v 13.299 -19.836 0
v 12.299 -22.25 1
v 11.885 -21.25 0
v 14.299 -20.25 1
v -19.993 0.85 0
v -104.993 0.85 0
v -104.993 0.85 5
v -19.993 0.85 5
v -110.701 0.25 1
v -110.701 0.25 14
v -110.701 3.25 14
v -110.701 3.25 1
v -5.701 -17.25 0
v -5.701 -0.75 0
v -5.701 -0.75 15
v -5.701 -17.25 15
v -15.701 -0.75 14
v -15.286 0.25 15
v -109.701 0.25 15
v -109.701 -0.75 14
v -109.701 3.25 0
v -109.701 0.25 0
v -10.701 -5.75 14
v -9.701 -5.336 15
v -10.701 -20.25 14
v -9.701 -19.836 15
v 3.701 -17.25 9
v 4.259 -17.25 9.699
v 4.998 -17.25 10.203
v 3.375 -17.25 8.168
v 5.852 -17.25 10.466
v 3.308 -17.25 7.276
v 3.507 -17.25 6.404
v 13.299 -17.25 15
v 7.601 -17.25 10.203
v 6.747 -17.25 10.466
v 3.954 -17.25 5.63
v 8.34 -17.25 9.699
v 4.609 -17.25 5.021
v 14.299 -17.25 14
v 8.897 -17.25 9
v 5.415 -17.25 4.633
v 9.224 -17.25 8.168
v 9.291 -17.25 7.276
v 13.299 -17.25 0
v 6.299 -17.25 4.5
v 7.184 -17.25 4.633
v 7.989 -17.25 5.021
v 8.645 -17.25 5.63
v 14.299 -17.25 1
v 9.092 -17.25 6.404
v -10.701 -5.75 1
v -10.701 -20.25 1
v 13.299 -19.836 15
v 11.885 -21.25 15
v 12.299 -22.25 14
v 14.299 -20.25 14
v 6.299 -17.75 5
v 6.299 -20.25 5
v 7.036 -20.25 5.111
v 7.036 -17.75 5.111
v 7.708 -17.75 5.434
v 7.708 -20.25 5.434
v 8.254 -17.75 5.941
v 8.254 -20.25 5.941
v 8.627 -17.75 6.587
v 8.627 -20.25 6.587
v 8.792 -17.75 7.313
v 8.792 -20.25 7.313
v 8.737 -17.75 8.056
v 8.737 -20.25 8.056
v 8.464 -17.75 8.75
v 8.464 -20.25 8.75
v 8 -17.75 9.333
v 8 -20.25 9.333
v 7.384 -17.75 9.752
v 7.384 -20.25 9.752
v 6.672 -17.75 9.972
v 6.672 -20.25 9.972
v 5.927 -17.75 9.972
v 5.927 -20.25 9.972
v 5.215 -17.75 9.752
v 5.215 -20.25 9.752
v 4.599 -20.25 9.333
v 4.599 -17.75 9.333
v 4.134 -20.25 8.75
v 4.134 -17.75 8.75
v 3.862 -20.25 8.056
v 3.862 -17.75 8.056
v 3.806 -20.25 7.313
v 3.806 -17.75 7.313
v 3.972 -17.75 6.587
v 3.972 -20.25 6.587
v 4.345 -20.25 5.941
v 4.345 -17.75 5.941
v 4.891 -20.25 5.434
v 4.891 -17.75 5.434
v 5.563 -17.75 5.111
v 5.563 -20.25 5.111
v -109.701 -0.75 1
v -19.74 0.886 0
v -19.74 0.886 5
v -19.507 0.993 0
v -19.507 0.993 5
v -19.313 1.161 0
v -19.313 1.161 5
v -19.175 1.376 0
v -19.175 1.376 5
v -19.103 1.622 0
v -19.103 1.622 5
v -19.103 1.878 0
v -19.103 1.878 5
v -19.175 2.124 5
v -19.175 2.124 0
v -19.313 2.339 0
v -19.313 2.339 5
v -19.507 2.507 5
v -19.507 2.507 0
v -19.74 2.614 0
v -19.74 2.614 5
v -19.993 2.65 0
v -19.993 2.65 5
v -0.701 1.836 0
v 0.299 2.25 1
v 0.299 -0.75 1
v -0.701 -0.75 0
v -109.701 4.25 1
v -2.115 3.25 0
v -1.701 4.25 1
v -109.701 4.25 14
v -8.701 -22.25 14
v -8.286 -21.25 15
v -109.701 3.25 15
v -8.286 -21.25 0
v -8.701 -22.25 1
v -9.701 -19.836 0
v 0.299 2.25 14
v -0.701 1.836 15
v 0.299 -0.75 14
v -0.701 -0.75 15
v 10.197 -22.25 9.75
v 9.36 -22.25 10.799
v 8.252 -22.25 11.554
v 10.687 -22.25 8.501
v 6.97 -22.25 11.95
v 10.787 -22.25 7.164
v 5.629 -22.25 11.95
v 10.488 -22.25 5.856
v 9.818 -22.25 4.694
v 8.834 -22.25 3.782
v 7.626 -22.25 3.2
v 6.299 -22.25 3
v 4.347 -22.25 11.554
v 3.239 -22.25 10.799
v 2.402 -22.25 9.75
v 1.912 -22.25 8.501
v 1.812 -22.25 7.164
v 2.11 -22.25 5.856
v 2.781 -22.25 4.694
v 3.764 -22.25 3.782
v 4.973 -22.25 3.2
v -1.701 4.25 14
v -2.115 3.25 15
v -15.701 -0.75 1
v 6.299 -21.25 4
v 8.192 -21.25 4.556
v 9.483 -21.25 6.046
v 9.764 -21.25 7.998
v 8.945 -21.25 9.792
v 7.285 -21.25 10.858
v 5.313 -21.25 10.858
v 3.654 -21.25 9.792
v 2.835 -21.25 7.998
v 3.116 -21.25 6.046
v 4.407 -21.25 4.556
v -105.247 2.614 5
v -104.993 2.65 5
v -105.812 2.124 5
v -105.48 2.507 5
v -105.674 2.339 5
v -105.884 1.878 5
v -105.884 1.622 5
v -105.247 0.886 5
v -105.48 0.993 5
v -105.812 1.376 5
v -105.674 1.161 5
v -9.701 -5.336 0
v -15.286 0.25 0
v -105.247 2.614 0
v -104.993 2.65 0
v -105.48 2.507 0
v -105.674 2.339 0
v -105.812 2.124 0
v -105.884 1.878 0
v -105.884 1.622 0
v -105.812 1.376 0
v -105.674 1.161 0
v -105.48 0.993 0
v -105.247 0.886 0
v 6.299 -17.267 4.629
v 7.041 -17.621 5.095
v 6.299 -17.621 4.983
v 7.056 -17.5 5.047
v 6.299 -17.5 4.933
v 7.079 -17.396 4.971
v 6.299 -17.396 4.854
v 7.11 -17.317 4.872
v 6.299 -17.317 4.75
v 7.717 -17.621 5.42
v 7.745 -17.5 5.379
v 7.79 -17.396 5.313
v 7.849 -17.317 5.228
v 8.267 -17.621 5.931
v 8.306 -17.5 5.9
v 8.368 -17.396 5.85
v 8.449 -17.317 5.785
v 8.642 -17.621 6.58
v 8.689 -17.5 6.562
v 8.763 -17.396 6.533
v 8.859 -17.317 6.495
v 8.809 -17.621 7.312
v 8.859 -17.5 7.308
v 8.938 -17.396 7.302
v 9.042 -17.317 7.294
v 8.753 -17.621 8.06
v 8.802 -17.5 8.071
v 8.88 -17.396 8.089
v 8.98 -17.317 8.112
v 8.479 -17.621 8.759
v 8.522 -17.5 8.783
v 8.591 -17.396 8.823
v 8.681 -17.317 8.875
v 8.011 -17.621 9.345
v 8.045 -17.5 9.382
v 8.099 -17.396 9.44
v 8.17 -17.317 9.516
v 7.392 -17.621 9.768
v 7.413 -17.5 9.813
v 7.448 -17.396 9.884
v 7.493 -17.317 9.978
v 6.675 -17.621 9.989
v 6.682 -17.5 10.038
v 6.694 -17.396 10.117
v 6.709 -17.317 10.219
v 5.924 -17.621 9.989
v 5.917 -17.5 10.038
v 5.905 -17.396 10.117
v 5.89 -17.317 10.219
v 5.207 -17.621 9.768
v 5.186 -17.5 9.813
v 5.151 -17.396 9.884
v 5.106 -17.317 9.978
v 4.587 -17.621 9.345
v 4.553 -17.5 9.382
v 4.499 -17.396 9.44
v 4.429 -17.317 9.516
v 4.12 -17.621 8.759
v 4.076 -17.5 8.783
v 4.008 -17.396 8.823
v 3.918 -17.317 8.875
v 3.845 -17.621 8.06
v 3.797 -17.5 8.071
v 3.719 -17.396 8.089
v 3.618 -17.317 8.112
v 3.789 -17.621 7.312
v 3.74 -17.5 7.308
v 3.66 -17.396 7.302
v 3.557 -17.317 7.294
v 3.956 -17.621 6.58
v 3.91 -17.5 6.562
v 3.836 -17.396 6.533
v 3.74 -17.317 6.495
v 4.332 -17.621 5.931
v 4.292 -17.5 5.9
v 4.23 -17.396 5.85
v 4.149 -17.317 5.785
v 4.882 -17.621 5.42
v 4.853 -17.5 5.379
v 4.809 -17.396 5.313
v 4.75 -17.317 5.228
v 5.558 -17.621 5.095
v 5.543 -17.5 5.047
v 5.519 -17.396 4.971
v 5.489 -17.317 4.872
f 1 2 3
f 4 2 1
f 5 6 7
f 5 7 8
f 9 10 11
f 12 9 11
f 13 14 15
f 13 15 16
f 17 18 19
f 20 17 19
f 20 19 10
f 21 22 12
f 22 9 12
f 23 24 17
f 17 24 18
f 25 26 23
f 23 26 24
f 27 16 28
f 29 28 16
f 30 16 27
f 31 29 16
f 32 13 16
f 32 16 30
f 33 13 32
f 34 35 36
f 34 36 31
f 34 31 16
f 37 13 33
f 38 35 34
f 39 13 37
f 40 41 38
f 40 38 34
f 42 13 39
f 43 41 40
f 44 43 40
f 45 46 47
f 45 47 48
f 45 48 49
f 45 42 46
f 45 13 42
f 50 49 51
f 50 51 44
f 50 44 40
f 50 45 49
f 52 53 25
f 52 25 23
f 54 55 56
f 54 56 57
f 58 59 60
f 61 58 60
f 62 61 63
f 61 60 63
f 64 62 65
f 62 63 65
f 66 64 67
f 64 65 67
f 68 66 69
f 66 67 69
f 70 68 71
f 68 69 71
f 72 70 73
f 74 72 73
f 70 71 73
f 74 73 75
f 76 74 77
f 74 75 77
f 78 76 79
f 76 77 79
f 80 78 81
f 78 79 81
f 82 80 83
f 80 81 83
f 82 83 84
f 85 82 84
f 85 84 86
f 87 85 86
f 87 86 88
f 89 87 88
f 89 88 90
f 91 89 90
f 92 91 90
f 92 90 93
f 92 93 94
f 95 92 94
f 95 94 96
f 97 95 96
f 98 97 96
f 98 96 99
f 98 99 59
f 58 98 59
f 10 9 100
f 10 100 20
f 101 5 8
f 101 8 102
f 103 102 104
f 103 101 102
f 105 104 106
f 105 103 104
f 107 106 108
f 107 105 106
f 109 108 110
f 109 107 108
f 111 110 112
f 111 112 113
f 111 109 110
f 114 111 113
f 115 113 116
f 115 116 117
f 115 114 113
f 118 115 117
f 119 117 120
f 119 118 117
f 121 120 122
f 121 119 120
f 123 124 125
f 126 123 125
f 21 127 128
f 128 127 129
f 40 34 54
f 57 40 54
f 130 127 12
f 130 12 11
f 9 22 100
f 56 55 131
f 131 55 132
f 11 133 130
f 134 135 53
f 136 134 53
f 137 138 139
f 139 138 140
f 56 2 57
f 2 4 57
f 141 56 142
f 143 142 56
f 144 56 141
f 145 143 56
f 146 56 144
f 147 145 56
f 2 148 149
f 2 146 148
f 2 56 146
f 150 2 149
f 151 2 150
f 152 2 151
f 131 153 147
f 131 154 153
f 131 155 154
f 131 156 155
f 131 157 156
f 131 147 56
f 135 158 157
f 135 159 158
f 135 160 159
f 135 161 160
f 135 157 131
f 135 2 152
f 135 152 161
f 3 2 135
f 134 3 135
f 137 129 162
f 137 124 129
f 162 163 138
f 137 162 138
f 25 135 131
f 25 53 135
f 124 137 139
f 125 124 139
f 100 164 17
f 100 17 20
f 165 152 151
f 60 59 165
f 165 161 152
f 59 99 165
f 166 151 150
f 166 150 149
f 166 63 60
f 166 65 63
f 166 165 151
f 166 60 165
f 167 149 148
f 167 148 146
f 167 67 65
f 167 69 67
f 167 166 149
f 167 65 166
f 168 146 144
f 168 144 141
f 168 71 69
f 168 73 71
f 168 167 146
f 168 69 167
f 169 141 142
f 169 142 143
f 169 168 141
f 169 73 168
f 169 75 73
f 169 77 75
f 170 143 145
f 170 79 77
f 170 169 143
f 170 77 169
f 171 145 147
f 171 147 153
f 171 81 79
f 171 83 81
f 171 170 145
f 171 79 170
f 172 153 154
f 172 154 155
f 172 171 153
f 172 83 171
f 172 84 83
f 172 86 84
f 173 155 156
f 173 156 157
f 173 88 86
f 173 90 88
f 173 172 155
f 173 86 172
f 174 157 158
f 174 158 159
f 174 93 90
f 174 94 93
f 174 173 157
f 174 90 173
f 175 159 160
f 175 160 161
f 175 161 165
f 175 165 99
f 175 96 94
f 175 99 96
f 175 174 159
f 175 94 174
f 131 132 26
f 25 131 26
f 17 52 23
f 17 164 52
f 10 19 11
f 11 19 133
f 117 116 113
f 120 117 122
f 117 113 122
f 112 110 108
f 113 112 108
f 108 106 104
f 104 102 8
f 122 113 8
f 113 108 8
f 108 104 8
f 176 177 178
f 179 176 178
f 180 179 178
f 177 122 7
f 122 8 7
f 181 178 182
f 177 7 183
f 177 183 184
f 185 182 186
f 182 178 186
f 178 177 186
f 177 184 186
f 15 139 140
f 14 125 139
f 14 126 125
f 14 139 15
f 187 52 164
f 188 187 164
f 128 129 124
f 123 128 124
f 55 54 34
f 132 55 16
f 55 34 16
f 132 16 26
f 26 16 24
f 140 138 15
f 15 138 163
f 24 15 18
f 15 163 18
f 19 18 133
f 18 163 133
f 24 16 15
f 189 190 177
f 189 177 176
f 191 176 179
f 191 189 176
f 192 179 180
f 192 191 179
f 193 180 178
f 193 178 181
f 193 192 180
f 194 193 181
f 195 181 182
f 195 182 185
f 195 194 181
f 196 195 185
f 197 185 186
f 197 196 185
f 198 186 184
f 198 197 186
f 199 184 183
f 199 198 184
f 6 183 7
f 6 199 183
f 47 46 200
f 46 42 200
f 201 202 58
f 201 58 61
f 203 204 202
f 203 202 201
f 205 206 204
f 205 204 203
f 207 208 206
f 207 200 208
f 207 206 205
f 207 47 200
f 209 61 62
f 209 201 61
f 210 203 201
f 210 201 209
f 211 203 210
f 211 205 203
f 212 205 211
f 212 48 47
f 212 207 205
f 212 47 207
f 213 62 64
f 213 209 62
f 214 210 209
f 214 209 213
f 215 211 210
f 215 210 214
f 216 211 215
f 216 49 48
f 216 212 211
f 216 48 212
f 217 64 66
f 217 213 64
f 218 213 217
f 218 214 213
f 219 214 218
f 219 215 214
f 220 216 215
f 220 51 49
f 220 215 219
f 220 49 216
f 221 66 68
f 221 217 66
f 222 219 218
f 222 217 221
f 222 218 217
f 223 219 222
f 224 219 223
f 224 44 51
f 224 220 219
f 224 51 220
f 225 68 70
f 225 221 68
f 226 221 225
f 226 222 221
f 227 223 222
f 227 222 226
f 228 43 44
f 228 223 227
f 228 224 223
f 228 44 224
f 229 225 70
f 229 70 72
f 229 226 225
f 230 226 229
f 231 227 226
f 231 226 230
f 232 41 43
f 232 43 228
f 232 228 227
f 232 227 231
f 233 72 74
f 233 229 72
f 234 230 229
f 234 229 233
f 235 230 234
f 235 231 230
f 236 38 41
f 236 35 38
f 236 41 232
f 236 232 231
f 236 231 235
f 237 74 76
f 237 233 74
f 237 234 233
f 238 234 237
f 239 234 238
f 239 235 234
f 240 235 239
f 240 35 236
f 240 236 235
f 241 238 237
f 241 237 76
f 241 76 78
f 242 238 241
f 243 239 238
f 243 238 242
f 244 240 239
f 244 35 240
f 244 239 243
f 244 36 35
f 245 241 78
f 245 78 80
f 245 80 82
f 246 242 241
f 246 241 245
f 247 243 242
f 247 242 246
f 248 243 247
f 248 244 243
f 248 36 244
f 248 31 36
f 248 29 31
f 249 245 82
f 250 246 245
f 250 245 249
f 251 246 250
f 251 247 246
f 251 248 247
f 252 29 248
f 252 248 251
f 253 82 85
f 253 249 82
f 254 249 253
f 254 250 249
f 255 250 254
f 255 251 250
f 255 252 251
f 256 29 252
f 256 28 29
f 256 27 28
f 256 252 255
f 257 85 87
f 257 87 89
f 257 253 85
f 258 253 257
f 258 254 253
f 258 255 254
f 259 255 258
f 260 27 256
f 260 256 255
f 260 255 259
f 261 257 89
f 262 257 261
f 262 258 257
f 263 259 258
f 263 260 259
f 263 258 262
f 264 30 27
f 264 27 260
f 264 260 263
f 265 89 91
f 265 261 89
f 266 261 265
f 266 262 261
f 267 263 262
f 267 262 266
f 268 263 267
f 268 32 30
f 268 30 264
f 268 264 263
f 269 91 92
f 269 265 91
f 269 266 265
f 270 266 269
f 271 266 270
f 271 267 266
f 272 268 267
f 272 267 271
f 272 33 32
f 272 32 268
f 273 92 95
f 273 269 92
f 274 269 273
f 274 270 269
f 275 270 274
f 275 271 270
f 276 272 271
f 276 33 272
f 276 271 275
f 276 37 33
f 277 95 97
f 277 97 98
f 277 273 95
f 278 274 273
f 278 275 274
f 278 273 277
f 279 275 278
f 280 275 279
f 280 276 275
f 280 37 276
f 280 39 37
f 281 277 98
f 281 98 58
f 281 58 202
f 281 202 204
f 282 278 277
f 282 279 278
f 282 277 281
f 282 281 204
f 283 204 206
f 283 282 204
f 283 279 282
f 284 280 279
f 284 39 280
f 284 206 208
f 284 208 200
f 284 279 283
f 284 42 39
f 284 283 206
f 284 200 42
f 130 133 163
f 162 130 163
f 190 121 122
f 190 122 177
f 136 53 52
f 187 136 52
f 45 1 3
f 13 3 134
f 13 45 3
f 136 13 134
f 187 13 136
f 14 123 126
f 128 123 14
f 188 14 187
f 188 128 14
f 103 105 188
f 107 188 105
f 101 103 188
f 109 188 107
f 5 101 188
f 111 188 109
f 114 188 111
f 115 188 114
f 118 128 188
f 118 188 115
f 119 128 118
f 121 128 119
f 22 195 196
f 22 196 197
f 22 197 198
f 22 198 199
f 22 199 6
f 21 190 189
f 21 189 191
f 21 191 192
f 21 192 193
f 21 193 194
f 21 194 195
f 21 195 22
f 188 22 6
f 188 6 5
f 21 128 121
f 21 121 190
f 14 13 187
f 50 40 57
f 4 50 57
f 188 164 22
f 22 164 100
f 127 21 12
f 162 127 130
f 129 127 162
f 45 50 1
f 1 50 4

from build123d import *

# Parameters (mm, degrees)
RESSALTO_EXTRUS_O1_DEPTH = 15
ESBO_O3_R                = 2.5
CORTE_EXTRUS_O1_DEPTH    = 15
CHANFRO1_SIZE            = 2
FILETE1_R                = 0.5
CHANFRO5_SIZE            = 2
CHANFRO7_SIZE            = 5
CHANFRO9_SIZE            = 1
CORTE_EXTRUS_O2_DEPTH    = 5


with BuildPart() as part:
    # Esboço1 → Ressalto-extrusão1 (new body)
    with BuildSketch(Plane.XY):
        Polygon((0.299414955, -0.75), (-5.700585045, -0.75), (-5.700585045, -17.25), (14.299414955, -17.25), (14.299414955, -22.25), (-10.700585045, -22.25), (-10.700585045, -0.75), (-110.700585045, -0.75), (-110.700585045, 4.25), (0.299414955, 4.25), align=None)
    extrude(amount=RESSALTO_EXTRUS_O1_DEPTH)

    # Esboço3 → Corte-extrusão1 (cut)
    with BuildSketch(Plane.XZ.offset(22.25)):
        with Locations(Location((6.299414955, 7.5, 0), (0, 0, 270))):
            Circle(ESBO_O3_R)
    extrude(amount=-CORTE_EXTRUS_O1_DEPTH, mode=Mode.SUBTRACT)

    # Chanfro1
    chanfro1_edges = [part.edges().sort_by_distance(p)[0] for p in [
        (6.299414955, -22.25, 10),
    ]]
    chamfer(chanfro1_edges, length=CHANFRO1_SIZE)

    # Filete1
    filete1_edges = [part.edges().sort_by_distance(p)[0] for p in [
        (6.299414955, -17.25, 10),
    ]]
    fillet(filete1_edges, radius=FILETE1_R)

    # Chanfro5
    chanfro5_edges = [part.edges().sort_by_distance(p)[0] for p in [
        (14.299414955, -22.25, 7.5),
        (-10.700585045, -22.25, 7.5),
        (0.299414955, 4.25, 7.5),
    ]]
    chamfer(chanfro5_edges, length=CHANFRO5_SIZE)

    # Chanfro7
    chanfro7_edges = [part.edges().sort_by_distance(p)[0] for p in [
        (-10.700585045, -0.75, 7.5),
    ]]
    chamfer(chanfro7_edges, length=CHANFRO7_SIZE)

    # Chanfro9
    chanfro9_edges = [part.edges().sort_by_distance(p)[0] for p in [
        (13.299414955, -21.25, 0),
        (14.299414955, -18.75, 0),
        (0.299414955, 0.75, 0),
        (-0.700585045, 3.25, 0),
        (-56.200585045, 4.25, 0),
        (-110.700585045, 1.75, 0),
        (-63.200585045, -0.75, 0),
        (-13.200585045, -3.25, 0),
        (-10.700585045, -13, 0),
        (-9.700585045, -21.25, 0),
        (1.799414955, -22.25, 0),
        (-110.700585045, 1.75, 15),
        (-56.200585045, 4.25, 15),
        (-0.700585045, 3.25, 15),
        (0.299414955, 0.75, 15),
        (14.299414955, -18.75, 15),
        (13.299414955, -21.25, 15),
        (1.799414955, -22.25, 15),
        (-9.700585045, -21.25, 15),
        (-10.700585045, -13, 15),
        (-13.200585045, -3.25, 15),
        (-63.200585045, -0.75, 15),
        (-110.700585045, 4.25, 7.5),
        (-110.700585045, -0.75, 7.5),
    ]]
    chamfer(chanfro9_edges, length=CHANFRO9_SIZE)

    # Esboço4 → Corte-extrusão2 (cut)
    with BuildSketch(Plane(origin=(0, -10.75, 0), x_dir=(1, 0, 0), z_dir=(0, 0, -1))):
        with BuildLine():
            Line((-104.993478264, -11.6), (-19.993478264, -11.6))
            ThreePointArc((-19.993478264, -11.6), (-19.093478264, -12.5), (-19.993478264, -13.4))
            Line((-19.993478264, -13.4), (-104.993478264, -13.4))
            ThreePointArc((-104.993478264, -13.4), (-105.893478264, -12.5), (-104.993478264, -11.6))
        make_face()
    extrude(amount=-CORTE_EXTRUS_O2_DEPTH, mode=Mode.SUBTRACT)


solid = part.part
